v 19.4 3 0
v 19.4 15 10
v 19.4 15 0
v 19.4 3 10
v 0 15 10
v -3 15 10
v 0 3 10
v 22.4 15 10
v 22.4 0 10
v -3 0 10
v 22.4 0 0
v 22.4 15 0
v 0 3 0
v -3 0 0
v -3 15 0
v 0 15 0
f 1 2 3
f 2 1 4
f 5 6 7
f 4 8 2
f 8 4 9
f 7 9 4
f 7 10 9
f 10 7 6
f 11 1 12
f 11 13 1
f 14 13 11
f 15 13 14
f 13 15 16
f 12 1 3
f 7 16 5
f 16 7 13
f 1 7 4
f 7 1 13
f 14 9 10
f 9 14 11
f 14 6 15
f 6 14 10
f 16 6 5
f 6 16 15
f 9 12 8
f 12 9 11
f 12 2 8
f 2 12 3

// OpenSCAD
//book thickness (mm)
thickness = 19.4;

cube(size=[thickness,3,10]);
translate([-3,0,0])
cube(size=[3,15,10]);
translate([thickness,0,0])
cube(size=[3,15,10]);
